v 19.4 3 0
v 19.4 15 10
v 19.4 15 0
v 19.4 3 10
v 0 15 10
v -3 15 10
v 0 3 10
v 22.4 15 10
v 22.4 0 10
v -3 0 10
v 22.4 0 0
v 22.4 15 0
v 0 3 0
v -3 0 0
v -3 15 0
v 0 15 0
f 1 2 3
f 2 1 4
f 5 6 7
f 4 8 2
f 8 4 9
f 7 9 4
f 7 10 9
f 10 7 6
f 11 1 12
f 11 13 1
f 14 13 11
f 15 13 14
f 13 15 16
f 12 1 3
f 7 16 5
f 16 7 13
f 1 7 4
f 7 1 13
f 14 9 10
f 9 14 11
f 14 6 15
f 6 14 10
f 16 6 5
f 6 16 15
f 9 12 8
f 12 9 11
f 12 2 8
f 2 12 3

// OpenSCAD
//book thickness (mm)
thickness = 19.4;

cube(size=[thickness,3,10]);
translate([-3,0,0])
cube(size=[3,15,10]);
translate([thickness,0,0])
cube(size=[3,15,10]);
